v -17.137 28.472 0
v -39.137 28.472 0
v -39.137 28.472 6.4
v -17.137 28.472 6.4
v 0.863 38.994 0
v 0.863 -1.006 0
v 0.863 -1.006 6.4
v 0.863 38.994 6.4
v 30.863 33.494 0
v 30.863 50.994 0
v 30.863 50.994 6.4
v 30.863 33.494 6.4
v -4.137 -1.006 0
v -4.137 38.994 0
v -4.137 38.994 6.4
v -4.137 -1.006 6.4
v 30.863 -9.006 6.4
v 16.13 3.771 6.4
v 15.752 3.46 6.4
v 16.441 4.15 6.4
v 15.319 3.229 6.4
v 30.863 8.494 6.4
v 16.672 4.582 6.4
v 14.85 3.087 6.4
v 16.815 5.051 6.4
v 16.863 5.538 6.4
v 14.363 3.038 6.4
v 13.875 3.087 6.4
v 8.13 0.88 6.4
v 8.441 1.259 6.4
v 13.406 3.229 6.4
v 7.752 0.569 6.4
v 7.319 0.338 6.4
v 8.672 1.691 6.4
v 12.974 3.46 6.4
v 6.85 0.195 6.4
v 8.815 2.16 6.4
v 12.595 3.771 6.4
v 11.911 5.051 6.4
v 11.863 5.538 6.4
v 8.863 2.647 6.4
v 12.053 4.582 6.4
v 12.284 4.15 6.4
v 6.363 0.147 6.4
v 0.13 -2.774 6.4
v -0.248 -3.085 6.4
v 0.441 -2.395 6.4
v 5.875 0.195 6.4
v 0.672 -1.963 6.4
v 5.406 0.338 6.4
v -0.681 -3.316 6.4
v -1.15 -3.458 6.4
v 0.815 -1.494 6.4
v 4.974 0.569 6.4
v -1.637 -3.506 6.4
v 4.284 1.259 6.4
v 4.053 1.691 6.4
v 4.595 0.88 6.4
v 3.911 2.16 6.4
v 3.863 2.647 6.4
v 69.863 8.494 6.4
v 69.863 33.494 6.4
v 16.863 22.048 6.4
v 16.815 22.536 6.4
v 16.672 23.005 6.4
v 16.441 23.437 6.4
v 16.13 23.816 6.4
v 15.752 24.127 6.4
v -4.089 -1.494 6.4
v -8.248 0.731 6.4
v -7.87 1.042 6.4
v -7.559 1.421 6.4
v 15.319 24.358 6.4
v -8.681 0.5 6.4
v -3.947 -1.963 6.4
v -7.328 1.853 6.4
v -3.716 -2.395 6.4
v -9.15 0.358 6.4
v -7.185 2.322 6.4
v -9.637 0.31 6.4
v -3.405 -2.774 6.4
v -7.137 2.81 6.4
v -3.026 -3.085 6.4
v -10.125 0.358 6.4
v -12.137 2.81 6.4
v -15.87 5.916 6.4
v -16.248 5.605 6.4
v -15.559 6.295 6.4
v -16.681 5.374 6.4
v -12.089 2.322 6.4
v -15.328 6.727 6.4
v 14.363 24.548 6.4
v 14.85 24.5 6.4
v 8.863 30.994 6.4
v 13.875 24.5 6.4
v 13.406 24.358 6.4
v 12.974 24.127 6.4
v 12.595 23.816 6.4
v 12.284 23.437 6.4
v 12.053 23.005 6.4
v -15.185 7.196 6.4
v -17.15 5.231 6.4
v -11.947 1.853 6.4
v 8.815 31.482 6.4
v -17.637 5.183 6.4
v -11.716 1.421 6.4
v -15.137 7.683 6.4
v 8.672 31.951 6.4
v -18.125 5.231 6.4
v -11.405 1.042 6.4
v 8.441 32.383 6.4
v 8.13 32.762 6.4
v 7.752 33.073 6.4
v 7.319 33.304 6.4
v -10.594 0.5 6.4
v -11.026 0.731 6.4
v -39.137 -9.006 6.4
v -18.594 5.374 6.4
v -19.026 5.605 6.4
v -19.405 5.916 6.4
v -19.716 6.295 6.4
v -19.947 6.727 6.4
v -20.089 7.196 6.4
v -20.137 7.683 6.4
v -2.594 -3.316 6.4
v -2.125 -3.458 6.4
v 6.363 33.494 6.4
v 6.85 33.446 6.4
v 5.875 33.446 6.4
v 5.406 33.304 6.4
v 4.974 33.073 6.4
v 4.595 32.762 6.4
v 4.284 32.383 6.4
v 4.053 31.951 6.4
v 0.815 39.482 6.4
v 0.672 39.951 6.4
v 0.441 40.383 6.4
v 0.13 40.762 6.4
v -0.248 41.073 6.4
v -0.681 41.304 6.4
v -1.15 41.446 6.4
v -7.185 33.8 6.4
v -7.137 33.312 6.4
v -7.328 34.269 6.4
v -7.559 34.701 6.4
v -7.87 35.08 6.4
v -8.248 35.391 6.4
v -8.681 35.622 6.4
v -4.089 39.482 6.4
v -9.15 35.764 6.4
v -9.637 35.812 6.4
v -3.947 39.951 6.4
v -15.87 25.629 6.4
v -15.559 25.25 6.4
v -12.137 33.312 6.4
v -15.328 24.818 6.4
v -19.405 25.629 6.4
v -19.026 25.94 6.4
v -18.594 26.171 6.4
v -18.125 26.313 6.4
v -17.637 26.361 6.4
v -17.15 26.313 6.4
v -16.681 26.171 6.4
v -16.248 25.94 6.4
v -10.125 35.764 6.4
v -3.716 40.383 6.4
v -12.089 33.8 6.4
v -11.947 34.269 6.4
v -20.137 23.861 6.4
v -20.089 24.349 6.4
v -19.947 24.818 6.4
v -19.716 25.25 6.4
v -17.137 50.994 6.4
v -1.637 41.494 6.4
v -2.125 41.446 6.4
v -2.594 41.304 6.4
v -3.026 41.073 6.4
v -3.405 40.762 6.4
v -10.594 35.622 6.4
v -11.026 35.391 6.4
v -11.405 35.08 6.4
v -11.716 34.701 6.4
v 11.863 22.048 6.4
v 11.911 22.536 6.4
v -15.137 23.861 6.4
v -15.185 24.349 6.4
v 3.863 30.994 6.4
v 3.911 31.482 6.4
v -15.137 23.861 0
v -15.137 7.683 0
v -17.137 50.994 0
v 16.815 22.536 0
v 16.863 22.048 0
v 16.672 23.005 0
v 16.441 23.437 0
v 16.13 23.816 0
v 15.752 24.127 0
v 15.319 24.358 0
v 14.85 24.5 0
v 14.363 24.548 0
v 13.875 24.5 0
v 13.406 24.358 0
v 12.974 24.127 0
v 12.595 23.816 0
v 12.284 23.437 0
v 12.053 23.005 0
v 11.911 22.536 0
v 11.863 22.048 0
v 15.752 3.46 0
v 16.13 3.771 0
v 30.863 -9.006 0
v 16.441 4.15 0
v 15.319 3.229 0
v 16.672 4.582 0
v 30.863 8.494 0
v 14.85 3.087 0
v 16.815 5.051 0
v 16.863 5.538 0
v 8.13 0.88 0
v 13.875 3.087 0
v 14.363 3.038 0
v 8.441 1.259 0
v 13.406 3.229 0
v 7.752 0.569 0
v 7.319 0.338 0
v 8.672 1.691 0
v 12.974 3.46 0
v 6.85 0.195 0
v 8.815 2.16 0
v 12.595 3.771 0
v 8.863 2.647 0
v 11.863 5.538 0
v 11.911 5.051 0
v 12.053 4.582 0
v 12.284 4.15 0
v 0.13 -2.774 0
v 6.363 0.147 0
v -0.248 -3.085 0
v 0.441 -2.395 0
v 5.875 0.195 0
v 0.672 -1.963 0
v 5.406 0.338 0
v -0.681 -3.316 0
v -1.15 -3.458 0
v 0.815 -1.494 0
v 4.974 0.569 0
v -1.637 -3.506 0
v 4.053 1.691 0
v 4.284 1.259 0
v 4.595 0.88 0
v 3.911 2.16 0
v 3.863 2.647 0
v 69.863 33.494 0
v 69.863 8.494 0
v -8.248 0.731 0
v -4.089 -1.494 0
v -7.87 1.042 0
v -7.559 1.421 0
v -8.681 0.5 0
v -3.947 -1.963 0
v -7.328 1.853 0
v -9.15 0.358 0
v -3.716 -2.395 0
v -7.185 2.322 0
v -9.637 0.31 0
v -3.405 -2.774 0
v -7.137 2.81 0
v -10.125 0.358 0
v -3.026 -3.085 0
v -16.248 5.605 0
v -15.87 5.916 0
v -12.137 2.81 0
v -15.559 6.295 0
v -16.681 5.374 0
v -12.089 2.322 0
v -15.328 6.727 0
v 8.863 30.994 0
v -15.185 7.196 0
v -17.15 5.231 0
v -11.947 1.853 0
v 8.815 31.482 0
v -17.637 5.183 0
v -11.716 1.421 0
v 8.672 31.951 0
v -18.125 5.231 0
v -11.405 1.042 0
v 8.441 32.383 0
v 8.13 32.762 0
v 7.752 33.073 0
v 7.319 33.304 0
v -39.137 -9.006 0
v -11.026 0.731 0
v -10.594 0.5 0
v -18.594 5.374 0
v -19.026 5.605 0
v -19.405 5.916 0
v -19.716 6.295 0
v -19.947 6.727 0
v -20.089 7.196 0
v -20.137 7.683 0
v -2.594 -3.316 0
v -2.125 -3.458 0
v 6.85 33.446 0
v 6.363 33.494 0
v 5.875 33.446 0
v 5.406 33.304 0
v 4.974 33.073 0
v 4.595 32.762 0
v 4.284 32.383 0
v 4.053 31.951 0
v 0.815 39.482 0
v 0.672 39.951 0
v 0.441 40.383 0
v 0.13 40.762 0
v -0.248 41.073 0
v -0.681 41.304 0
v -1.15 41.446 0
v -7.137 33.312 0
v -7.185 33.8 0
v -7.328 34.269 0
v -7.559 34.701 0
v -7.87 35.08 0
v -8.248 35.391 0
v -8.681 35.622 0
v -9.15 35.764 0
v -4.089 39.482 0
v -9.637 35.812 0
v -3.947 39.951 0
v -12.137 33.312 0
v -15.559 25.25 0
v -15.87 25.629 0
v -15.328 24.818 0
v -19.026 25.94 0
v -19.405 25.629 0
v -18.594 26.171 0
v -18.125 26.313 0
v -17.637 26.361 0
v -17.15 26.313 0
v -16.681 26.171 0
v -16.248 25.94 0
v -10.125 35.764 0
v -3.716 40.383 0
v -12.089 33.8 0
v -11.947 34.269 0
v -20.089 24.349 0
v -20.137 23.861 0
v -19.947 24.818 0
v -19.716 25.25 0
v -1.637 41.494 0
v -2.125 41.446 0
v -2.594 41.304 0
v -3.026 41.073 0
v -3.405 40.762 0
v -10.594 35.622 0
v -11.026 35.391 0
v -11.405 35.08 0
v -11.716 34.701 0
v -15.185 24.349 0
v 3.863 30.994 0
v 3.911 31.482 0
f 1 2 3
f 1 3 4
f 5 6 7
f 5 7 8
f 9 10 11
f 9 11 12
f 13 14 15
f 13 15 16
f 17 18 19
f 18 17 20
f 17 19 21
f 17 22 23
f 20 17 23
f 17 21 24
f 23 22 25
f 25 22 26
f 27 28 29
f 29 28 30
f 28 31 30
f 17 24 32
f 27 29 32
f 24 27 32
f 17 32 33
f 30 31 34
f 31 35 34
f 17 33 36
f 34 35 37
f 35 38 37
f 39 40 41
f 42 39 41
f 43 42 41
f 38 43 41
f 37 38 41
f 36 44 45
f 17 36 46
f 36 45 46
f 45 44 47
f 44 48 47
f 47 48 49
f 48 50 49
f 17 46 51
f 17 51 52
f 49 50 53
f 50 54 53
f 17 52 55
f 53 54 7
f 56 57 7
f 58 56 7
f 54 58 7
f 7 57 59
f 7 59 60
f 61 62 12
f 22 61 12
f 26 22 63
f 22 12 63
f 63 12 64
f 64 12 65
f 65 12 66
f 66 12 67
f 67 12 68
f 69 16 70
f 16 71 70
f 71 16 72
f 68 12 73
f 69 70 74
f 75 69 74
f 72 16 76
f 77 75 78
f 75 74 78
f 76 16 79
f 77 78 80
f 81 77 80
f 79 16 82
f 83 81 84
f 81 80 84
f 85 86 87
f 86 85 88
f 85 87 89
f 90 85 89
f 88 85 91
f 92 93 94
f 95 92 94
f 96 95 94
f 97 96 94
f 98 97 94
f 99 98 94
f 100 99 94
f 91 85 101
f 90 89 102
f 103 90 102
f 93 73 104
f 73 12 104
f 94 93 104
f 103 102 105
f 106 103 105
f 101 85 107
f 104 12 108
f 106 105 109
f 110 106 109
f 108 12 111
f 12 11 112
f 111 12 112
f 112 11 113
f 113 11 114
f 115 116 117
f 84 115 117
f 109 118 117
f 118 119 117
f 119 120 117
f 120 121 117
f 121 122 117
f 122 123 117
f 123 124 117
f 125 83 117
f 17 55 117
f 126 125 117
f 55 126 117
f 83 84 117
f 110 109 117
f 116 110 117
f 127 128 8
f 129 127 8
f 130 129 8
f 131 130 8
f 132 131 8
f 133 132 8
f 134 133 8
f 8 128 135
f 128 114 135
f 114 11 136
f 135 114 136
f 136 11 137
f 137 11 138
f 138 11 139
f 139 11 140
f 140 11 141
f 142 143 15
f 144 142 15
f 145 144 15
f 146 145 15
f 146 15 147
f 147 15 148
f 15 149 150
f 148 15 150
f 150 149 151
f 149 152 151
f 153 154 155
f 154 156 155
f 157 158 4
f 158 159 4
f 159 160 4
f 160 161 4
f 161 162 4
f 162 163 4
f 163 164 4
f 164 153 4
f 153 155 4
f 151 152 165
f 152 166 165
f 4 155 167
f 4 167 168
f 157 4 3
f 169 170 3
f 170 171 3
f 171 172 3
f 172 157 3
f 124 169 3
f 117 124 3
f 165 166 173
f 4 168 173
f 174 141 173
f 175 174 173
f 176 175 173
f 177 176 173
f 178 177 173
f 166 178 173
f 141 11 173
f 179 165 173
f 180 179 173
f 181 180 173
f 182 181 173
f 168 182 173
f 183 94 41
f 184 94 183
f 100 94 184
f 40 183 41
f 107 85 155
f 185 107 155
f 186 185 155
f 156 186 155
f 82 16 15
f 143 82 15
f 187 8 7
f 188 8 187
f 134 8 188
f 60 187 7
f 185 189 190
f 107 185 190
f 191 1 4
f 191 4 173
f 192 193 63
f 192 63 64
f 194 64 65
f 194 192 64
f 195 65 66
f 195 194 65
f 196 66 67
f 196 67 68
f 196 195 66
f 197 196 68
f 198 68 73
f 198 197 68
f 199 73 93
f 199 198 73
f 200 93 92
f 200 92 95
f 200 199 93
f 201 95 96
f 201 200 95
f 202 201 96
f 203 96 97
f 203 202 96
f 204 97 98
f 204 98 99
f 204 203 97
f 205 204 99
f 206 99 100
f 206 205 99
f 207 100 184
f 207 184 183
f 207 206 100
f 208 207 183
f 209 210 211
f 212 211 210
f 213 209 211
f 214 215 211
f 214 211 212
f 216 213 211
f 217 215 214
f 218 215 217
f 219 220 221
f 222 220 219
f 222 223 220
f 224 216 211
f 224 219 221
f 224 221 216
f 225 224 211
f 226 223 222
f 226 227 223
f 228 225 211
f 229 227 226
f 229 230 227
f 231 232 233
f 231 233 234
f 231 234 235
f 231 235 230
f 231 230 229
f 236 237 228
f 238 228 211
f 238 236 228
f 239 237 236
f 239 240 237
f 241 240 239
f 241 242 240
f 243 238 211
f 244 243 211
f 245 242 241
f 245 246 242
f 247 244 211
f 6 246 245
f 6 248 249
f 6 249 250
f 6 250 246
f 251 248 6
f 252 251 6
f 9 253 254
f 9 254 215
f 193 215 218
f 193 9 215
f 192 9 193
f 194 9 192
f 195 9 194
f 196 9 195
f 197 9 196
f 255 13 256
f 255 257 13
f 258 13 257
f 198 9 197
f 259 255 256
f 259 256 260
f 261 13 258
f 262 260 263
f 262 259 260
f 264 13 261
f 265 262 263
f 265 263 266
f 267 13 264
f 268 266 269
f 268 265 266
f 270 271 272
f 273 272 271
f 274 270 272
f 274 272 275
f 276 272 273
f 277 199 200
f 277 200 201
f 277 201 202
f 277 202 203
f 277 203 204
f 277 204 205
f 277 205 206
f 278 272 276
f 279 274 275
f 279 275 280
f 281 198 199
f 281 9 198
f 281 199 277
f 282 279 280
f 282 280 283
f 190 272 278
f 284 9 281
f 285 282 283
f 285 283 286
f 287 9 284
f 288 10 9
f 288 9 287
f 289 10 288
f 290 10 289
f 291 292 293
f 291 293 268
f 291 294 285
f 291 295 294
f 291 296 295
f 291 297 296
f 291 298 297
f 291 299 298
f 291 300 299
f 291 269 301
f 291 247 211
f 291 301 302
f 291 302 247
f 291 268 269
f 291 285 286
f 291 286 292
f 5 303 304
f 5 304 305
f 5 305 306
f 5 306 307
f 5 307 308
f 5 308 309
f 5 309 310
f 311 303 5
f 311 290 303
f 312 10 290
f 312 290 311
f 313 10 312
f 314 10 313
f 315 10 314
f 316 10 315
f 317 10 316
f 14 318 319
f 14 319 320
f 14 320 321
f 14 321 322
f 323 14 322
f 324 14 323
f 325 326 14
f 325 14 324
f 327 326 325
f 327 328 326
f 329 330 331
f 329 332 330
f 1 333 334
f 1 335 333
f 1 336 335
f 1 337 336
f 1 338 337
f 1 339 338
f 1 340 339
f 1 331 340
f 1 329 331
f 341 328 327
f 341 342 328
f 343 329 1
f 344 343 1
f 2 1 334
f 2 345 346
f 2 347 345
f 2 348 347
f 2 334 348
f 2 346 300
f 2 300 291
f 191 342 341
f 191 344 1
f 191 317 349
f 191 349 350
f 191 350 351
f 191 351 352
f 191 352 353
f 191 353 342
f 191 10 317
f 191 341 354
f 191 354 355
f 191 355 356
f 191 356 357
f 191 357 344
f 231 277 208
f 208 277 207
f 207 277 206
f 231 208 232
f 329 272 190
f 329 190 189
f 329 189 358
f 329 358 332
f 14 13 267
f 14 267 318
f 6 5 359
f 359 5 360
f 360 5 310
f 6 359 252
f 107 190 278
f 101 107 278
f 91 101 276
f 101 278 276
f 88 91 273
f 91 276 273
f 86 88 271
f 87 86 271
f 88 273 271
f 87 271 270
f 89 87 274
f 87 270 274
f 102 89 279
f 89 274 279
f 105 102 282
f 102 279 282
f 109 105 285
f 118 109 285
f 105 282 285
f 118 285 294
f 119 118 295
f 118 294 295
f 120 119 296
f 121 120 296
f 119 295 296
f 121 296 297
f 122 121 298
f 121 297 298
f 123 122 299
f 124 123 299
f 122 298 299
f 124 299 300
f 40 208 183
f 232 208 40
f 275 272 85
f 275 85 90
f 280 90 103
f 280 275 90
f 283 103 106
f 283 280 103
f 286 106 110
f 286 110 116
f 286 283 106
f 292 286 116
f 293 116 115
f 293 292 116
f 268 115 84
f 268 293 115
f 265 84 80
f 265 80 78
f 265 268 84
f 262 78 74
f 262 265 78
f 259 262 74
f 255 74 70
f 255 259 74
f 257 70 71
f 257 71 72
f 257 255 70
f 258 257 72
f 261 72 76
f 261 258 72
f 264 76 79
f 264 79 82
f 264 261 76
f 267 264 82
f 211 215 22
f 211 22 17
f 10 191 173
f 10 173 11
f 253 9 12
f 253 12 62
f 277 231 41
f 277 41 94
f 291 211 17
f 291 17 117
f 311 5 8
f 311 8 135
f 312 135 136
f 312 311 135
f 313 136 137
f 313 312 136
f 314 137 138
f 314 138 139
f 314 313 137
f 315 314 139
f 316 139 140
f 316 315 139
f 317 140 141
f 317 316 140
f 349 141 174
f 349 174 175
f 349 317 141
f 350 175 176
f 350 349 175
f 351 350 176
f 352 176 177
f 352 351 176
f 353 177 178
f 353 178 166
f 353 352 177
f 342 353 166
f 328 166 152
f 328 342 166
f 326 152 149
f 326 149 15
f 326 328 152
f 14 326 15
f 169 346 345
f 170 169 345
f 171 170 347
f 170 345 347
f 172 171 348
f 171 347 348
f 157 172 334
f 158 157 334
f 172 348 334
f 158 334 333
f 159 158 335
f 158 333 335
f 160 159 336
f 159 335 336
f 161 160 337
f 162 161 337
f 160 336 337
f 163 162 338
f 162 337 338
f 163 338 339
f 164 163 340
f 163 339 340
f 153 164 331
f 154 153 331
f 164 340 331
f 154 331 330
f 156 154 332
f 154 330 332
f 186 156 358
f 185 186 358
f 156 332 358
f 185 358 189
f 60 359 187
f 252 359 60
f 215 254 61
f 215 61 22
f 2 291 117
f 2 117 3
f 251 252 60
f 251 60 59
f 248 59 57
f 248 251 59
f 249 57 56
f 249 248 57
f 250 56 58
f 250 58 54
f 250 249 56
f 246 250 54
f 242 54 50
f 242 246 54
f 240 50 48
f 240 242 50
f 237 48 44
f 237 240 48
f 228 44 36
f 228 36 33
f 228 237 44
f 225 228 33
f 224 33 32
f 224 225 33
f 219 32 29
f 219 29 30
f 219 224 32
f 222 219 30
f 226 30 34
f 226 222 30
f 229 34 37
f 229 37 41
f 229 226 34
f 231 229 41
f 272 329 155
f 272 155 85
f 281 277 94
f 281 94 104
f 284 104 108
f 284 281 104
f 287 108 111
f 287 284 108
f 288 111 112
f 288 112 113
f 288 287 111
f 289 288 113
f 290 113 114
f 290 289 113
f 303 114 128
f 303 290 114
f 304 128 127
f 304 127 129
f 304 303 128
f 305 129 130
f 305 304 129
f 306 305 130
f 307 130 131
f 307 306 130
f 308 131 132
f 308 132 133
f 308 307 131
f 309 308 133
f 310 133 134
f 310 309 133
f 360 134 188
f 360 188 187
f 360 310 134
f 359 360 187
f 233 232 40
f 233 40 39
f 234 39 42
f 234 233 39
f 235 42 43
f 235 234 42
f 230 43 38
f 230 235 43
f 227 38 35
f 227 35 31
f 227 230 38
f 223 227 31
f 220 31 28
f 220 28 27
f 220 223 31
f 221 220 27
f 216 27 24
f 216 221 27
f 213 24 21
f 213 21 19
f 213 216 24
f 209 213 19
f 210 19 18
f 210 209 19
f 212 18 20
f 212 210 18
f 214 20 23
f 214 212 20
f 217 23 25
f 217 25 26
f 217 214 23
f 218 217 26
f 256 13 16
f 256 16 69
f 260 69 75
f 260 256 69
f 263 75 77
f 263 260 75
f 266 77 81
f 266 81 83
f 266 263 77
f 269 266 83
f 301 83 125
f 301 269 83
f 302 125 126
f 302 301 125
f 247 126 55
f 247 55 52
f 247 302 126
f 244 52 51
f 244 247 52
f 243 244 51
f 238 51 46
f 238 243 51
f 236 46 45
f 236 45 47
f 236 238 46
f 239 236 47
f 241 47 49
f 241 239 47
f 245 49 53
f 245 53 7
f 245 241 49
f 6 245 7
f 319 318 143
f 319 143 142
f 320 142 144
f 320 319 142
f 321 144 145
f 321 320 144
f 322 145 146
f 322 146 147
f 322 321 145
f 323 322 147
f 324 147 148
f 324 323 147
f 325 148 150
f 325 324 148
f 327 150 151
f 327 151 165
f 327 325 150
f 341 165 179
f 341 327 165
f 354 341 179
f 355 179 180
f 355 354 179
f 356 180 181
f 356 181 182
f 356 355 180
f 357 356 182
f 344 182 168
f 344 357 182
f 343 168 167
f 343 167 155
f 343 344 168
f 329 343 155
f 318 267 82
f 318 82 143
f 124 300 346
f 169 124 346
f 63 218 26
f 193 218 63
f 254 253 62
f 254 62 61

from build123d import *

# Parameters (mm, degrees)
BOSS_EXTRUDE1_DEPTH = 6.4


with BuildPart() as part:
    # Sketch1 → Boss-Extrude1 (new body)
    with BuildSketch(Plane.XY):
        Polygon((30.862718171, 33.494054131), (69.862718171, 33.494054131), (69.862718171, 8.494054131), (30.862718171, 8.494054131), (30.862718171, -9.005945869), (-39.137281829, -9.005945869), (-39.137281829, 28.472304637), (-17.137281829, 28.472304637), (-17.137281829, 50.994054131), (30.862718171, 50.994054131), align=None)
        with BuildLine():
            Line((-4.137281829, 38.994054131), (-4.137281829, -1.005945869))
            ThreePointArc((-4.137281829, -1.005945869), (-1.637281829, -3.505945869), (0.862718171, -1.005945869))
            Line((0.862718171, -1.005945869), (0.862718171, 38.994054131))
            ThreePointArc((0.862718171, 38.994054131), (-1.637281829, 41.494054131), (-4.137281829, 38.994054131))
        make_face(mode=Mode.SUBTRACT)
        with BuildLine():
            Line((-12.137281829, 33.312431903), (-12.137281829, 2.809827896))
            ThreePointArc((-12.137281829, 2.809827896), (-9.637281829, 0.309827896), (-7.137281829, 2.809827896))
            Line((-7.137281829, 2.809827896), (-7.137281829, 33.312431903))
            ThreePointArc((-7.137281829, 33.312431903), (-9.637281829, 35.812431903), (-12.137281829, 33.312431903))
        make_face(mode=Mode.SUBTRACT)
        with BuildLine():
            Line((-15.137281829, 23.861283589), (-15.137281829, 7.683449462))
            ThreePointArc((-15.137281829, 7.683449462), (-17.637281829, 5.183449462), (-20.137281829, 7.683449462))
            Line((-20.137281829, 7.683449462), (-20.137281829, 23.861283589))
            ThreePointArc((-20.137281829, 23.861283589), (-17.637281829, 26.361283589), (-15.137281829, 23.861283589))
        make_face(mode=Mode.SUBTRACT)
        with BuildLine():
            Line((3.862718171, 30.994054131), (3.862718171, 2.647434443))
            ThreePointArc((3.862718171, 2.647434443), (6.362718171, 0.147434443), (8.862718171, 2.647434443))
            Line((8.862718171, 2.647434443), (8.862718171, 30.994054131))
            ThreePointArc((8.862718171, 30.994054131), (6.362718171, 33.494054131), (3.862718171, 30.994054131))
        make_face(mode=Mode.SUBTRACT)
        with BuildLine():
            Line((11.862718171, 22.048271006), (11.862718171, 5.538473012))
            ThreePointArc((11.862718171, 5.538473012), (14.362718171, 3.038473012), (16.862718171, 5.538473012))
            Line((16.862718171, 5.538473012), (16.862718171, 22.048271006))
            ThreePointArc((16.862718171, 22.048271006), (14.362718171, 24.548271006), (11.862718171, 22.048271006))
        make_face(mode=Mode.SUBTRACT)
    extrude(amount=BOSS_EXTRUDE1_DEPTH)


solid = part.part
